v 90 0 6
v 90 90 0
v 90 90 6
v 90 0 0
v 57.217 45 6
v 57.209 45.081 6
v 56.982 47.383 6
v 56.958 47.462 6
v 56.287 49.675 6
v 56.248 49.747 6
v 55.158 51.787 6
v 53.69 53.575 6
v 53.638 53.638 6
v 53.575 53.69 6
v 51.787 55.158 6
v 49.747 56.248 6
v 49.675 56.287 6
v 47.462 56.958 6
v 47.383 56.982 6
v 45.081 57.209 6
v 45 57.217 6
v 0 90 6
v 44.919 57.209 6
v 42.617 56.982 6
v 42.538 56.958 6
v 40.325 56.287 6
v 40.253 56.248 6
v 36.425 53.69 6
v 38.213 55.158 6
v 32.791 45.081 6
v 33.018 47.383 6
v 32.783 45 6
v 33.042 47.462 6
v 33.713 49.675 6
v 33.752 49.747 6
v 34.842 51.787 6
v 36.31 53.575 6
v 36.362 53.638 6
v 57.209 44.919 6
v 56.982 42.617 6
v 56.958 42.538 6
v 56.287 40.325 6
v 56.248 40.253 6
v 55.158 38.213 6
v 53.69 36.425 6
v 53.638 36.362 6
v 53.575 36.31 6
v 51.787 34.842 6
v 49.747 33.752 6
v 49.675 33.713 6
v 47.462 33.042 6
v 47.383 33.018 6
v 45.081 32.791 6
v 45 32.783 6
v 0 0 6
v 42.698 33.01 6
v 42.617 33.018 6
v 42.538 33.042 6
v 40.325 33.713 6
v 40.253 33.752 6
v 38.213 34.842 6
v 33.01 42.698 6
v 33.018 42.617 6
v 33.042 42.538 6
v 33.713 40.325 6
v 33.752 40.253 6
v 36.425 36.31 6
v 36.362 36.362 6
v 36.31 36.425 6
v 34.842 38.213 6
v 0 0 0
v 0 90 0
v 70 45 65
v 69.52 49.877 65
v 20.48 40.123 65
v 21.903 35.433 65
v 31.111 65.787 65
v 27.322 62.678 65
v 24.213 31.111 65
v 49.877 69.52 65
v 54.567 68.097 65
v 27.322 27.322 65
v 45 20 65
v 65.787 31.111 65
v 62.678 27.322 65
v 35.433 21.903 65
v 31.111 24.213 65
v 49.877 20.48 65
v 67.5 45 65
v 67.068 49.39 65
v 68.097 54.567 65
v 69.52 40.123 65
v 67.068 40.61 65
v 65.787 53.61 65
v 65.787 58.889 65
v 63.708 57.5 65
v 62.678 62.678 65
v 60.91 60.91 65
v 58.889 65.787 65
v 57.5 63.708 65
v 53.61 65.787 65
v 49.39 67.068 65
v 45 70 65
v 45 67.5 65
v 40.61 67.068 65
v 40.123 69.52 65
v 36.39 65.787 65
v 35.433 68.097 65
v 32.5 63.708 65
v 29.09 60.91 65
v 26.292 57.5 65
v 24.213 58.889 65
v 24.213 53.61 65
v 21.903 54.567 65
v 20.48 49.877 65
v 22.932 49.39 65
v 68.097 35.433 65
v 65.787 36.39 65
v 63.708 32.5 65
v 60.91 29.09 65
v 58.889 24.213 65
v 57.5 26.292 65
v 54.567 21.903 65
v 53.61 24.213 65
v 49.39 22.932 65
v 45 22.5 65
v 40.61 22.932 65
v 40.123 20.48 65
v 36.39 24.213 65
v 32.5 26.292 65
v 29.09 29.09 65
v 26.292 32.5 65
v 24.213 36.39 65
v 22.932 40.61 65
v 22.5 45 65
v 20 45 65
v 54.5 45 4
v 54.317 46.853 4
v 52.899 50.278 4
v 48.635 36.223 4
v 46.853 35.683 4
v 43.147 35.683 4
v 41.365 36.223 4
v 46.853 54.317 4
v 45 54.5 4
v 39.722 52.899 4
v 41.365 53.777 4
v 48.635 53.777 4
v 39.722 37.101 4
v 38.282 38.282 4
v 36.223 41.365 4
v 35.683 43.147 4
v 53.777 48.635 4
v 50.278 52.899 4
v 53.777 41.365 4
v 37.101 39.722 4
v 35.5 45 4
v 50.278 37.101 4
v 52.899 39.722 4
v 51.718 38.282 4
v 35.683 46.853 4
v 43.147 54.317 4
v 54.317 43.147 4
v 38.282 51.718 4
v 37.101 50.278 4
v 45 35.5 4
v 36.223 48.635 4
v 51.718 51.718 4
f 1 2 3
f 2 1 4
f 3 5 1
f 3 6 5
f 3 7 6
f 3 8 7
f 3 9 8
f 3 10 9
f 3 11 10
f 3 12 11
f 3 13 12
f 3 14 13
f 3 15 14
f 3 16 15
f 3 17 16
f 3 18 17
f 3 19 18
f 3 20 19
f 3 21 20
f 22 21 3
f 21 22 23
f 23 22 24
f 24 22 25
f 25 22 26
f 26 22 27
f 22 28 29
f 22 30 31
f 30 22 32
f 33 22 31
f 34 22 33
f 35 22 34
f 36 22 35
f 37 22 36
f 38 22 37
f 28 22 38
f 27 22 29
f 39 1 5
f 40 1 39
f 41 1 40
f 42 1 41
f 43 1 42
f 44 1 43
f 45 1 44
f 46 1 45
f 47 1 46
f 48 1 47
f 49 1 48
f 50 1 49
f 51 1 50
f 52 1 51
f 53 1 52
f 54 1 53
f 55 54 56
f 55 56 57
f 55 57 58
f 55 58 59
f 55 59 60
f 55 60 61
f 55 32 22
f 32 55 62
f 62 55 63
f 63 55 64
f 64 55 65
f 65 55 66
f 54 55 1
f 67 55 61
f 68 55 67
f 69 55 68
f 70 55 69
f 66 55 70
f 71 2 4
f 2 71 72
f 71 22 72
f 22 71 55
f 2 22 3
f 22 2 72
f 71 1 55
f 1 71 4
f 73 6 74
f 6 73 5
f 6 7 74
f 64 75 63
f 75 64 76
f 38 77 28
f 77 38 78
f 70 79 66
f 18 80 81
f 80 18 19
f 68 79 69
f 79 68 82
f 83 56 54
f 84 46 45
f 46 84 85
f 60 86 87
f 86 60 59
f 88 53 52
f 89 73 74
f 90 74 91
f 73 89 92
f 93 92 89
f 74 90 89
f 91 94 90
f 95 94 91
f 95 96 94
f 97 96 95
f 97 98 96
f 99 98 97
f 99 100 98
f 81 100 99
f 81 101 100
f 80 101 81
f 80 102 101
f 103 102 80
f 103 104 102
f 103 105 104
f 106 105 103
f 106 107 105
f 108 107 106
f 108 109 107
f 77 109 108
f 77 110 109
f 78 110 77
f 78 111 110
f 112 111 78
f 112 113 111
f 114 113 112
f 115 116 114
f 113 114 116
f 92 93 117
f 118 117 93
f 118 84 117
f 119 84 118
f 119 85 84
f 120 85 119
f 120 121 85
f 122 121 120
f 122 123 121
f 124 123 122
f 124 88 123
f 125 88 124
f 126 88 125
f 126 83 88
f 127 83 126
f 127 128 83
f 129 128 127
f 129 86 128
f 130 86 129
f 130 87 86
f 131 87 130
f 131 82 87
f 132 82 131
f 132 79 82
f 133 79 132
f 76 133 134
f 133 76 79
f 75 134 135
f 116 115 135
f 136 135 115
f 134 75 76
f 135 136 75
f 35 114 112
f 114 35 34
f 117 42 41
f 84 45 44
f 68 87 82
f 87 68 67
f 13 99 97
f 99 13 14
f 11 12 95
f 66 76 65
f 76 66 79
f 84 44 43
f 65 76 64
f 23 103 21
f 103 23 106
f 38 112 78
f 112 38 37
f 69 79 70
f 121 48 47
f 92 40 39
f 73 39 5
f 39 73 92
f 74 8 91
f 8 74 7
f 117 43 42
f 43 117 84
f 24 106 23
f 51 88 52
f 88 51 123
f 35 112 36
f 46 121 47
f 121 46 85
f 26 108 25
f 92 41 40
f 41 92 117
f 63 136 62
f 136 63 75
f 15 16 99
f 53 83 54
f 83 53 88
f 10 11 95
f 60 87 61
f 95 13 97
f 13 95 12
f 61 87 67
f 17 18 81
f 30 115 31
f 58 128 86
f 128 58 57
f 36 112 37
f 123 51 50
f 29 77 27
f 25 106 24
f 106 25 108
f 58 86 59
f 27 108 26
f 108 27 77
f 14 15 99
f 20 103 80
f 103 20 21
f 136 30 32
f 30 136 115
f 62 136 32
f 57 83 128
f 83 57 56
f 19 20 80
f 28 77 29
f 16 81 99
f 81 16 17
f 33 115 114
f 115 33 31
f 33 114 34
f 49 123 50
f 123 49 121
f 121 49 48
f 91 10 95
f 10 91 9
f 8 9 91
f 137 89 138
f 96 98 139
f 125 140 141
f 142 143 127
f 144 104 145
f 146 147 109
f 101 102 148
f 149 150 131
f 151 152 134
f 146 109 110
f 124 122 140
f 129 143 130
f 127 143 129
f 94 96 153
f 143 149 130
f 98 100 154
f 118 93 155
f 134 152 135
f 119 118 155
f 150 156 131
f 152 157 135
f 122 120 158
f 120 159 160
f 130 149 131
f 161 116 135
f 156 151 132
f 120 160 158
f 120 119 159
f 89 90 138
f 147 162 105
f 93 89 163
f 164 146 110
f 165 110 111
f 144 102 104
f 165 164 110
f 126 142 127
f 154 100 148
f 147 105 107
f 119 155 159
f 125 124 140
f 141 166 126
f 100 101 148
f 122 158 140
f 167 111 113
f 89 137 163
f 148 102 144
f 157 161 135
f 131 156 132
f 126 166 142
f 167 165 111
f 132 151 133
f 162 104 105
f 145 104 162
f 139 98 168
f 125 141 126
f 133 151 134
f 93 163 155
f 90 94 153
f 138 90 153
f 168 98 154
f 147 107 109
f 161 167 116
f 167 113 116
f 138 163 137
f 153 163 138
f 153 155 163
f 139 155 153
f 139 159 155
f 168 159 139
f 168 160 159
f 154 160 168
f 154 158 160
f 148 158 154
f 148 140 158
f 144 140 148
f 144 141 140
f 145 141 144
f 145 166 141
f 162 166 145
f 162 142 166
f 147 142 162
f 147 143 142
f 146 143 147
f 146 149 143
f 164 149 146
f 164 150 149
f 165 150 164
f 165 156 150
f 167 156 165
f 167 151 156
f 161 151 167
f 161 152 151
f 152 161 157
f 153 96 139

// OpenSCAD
$fn = 32;

// ----------------------------------------------------------------------
// Hopper: funnel with square flange
// ----------------------------------------------------------------------

// --- parameters (mm) ---
fl = 90;                  // flange side, X and Y
fl_t = 6;                 // flange thickness
cone_h = 60;              // cone height above the flange
top_d = 50;               // cone mouth diameter
bot_d = 24;               // cone spout diameter
wall = 2.5;               // cone wall thickness

bore_d = bot_d - 2 * wall;  // spout bore diameter
total_h = fl_t + cone_h - 1;  // overall height

difference() {
  union() {
    cube([fl, fl, fl_t]);
    translate([fl / 2, fl / 2, fl_t - 1])
      cylinder(h = cone_h, d1 = bot_d, d2 = top_d);
  }
  translate([fl / 2, fl / 2, fl_t - 2])
    cylinder(h = cone_h + 1, d1 = bore_d, d2 = top_d - 2 * wall);
}
